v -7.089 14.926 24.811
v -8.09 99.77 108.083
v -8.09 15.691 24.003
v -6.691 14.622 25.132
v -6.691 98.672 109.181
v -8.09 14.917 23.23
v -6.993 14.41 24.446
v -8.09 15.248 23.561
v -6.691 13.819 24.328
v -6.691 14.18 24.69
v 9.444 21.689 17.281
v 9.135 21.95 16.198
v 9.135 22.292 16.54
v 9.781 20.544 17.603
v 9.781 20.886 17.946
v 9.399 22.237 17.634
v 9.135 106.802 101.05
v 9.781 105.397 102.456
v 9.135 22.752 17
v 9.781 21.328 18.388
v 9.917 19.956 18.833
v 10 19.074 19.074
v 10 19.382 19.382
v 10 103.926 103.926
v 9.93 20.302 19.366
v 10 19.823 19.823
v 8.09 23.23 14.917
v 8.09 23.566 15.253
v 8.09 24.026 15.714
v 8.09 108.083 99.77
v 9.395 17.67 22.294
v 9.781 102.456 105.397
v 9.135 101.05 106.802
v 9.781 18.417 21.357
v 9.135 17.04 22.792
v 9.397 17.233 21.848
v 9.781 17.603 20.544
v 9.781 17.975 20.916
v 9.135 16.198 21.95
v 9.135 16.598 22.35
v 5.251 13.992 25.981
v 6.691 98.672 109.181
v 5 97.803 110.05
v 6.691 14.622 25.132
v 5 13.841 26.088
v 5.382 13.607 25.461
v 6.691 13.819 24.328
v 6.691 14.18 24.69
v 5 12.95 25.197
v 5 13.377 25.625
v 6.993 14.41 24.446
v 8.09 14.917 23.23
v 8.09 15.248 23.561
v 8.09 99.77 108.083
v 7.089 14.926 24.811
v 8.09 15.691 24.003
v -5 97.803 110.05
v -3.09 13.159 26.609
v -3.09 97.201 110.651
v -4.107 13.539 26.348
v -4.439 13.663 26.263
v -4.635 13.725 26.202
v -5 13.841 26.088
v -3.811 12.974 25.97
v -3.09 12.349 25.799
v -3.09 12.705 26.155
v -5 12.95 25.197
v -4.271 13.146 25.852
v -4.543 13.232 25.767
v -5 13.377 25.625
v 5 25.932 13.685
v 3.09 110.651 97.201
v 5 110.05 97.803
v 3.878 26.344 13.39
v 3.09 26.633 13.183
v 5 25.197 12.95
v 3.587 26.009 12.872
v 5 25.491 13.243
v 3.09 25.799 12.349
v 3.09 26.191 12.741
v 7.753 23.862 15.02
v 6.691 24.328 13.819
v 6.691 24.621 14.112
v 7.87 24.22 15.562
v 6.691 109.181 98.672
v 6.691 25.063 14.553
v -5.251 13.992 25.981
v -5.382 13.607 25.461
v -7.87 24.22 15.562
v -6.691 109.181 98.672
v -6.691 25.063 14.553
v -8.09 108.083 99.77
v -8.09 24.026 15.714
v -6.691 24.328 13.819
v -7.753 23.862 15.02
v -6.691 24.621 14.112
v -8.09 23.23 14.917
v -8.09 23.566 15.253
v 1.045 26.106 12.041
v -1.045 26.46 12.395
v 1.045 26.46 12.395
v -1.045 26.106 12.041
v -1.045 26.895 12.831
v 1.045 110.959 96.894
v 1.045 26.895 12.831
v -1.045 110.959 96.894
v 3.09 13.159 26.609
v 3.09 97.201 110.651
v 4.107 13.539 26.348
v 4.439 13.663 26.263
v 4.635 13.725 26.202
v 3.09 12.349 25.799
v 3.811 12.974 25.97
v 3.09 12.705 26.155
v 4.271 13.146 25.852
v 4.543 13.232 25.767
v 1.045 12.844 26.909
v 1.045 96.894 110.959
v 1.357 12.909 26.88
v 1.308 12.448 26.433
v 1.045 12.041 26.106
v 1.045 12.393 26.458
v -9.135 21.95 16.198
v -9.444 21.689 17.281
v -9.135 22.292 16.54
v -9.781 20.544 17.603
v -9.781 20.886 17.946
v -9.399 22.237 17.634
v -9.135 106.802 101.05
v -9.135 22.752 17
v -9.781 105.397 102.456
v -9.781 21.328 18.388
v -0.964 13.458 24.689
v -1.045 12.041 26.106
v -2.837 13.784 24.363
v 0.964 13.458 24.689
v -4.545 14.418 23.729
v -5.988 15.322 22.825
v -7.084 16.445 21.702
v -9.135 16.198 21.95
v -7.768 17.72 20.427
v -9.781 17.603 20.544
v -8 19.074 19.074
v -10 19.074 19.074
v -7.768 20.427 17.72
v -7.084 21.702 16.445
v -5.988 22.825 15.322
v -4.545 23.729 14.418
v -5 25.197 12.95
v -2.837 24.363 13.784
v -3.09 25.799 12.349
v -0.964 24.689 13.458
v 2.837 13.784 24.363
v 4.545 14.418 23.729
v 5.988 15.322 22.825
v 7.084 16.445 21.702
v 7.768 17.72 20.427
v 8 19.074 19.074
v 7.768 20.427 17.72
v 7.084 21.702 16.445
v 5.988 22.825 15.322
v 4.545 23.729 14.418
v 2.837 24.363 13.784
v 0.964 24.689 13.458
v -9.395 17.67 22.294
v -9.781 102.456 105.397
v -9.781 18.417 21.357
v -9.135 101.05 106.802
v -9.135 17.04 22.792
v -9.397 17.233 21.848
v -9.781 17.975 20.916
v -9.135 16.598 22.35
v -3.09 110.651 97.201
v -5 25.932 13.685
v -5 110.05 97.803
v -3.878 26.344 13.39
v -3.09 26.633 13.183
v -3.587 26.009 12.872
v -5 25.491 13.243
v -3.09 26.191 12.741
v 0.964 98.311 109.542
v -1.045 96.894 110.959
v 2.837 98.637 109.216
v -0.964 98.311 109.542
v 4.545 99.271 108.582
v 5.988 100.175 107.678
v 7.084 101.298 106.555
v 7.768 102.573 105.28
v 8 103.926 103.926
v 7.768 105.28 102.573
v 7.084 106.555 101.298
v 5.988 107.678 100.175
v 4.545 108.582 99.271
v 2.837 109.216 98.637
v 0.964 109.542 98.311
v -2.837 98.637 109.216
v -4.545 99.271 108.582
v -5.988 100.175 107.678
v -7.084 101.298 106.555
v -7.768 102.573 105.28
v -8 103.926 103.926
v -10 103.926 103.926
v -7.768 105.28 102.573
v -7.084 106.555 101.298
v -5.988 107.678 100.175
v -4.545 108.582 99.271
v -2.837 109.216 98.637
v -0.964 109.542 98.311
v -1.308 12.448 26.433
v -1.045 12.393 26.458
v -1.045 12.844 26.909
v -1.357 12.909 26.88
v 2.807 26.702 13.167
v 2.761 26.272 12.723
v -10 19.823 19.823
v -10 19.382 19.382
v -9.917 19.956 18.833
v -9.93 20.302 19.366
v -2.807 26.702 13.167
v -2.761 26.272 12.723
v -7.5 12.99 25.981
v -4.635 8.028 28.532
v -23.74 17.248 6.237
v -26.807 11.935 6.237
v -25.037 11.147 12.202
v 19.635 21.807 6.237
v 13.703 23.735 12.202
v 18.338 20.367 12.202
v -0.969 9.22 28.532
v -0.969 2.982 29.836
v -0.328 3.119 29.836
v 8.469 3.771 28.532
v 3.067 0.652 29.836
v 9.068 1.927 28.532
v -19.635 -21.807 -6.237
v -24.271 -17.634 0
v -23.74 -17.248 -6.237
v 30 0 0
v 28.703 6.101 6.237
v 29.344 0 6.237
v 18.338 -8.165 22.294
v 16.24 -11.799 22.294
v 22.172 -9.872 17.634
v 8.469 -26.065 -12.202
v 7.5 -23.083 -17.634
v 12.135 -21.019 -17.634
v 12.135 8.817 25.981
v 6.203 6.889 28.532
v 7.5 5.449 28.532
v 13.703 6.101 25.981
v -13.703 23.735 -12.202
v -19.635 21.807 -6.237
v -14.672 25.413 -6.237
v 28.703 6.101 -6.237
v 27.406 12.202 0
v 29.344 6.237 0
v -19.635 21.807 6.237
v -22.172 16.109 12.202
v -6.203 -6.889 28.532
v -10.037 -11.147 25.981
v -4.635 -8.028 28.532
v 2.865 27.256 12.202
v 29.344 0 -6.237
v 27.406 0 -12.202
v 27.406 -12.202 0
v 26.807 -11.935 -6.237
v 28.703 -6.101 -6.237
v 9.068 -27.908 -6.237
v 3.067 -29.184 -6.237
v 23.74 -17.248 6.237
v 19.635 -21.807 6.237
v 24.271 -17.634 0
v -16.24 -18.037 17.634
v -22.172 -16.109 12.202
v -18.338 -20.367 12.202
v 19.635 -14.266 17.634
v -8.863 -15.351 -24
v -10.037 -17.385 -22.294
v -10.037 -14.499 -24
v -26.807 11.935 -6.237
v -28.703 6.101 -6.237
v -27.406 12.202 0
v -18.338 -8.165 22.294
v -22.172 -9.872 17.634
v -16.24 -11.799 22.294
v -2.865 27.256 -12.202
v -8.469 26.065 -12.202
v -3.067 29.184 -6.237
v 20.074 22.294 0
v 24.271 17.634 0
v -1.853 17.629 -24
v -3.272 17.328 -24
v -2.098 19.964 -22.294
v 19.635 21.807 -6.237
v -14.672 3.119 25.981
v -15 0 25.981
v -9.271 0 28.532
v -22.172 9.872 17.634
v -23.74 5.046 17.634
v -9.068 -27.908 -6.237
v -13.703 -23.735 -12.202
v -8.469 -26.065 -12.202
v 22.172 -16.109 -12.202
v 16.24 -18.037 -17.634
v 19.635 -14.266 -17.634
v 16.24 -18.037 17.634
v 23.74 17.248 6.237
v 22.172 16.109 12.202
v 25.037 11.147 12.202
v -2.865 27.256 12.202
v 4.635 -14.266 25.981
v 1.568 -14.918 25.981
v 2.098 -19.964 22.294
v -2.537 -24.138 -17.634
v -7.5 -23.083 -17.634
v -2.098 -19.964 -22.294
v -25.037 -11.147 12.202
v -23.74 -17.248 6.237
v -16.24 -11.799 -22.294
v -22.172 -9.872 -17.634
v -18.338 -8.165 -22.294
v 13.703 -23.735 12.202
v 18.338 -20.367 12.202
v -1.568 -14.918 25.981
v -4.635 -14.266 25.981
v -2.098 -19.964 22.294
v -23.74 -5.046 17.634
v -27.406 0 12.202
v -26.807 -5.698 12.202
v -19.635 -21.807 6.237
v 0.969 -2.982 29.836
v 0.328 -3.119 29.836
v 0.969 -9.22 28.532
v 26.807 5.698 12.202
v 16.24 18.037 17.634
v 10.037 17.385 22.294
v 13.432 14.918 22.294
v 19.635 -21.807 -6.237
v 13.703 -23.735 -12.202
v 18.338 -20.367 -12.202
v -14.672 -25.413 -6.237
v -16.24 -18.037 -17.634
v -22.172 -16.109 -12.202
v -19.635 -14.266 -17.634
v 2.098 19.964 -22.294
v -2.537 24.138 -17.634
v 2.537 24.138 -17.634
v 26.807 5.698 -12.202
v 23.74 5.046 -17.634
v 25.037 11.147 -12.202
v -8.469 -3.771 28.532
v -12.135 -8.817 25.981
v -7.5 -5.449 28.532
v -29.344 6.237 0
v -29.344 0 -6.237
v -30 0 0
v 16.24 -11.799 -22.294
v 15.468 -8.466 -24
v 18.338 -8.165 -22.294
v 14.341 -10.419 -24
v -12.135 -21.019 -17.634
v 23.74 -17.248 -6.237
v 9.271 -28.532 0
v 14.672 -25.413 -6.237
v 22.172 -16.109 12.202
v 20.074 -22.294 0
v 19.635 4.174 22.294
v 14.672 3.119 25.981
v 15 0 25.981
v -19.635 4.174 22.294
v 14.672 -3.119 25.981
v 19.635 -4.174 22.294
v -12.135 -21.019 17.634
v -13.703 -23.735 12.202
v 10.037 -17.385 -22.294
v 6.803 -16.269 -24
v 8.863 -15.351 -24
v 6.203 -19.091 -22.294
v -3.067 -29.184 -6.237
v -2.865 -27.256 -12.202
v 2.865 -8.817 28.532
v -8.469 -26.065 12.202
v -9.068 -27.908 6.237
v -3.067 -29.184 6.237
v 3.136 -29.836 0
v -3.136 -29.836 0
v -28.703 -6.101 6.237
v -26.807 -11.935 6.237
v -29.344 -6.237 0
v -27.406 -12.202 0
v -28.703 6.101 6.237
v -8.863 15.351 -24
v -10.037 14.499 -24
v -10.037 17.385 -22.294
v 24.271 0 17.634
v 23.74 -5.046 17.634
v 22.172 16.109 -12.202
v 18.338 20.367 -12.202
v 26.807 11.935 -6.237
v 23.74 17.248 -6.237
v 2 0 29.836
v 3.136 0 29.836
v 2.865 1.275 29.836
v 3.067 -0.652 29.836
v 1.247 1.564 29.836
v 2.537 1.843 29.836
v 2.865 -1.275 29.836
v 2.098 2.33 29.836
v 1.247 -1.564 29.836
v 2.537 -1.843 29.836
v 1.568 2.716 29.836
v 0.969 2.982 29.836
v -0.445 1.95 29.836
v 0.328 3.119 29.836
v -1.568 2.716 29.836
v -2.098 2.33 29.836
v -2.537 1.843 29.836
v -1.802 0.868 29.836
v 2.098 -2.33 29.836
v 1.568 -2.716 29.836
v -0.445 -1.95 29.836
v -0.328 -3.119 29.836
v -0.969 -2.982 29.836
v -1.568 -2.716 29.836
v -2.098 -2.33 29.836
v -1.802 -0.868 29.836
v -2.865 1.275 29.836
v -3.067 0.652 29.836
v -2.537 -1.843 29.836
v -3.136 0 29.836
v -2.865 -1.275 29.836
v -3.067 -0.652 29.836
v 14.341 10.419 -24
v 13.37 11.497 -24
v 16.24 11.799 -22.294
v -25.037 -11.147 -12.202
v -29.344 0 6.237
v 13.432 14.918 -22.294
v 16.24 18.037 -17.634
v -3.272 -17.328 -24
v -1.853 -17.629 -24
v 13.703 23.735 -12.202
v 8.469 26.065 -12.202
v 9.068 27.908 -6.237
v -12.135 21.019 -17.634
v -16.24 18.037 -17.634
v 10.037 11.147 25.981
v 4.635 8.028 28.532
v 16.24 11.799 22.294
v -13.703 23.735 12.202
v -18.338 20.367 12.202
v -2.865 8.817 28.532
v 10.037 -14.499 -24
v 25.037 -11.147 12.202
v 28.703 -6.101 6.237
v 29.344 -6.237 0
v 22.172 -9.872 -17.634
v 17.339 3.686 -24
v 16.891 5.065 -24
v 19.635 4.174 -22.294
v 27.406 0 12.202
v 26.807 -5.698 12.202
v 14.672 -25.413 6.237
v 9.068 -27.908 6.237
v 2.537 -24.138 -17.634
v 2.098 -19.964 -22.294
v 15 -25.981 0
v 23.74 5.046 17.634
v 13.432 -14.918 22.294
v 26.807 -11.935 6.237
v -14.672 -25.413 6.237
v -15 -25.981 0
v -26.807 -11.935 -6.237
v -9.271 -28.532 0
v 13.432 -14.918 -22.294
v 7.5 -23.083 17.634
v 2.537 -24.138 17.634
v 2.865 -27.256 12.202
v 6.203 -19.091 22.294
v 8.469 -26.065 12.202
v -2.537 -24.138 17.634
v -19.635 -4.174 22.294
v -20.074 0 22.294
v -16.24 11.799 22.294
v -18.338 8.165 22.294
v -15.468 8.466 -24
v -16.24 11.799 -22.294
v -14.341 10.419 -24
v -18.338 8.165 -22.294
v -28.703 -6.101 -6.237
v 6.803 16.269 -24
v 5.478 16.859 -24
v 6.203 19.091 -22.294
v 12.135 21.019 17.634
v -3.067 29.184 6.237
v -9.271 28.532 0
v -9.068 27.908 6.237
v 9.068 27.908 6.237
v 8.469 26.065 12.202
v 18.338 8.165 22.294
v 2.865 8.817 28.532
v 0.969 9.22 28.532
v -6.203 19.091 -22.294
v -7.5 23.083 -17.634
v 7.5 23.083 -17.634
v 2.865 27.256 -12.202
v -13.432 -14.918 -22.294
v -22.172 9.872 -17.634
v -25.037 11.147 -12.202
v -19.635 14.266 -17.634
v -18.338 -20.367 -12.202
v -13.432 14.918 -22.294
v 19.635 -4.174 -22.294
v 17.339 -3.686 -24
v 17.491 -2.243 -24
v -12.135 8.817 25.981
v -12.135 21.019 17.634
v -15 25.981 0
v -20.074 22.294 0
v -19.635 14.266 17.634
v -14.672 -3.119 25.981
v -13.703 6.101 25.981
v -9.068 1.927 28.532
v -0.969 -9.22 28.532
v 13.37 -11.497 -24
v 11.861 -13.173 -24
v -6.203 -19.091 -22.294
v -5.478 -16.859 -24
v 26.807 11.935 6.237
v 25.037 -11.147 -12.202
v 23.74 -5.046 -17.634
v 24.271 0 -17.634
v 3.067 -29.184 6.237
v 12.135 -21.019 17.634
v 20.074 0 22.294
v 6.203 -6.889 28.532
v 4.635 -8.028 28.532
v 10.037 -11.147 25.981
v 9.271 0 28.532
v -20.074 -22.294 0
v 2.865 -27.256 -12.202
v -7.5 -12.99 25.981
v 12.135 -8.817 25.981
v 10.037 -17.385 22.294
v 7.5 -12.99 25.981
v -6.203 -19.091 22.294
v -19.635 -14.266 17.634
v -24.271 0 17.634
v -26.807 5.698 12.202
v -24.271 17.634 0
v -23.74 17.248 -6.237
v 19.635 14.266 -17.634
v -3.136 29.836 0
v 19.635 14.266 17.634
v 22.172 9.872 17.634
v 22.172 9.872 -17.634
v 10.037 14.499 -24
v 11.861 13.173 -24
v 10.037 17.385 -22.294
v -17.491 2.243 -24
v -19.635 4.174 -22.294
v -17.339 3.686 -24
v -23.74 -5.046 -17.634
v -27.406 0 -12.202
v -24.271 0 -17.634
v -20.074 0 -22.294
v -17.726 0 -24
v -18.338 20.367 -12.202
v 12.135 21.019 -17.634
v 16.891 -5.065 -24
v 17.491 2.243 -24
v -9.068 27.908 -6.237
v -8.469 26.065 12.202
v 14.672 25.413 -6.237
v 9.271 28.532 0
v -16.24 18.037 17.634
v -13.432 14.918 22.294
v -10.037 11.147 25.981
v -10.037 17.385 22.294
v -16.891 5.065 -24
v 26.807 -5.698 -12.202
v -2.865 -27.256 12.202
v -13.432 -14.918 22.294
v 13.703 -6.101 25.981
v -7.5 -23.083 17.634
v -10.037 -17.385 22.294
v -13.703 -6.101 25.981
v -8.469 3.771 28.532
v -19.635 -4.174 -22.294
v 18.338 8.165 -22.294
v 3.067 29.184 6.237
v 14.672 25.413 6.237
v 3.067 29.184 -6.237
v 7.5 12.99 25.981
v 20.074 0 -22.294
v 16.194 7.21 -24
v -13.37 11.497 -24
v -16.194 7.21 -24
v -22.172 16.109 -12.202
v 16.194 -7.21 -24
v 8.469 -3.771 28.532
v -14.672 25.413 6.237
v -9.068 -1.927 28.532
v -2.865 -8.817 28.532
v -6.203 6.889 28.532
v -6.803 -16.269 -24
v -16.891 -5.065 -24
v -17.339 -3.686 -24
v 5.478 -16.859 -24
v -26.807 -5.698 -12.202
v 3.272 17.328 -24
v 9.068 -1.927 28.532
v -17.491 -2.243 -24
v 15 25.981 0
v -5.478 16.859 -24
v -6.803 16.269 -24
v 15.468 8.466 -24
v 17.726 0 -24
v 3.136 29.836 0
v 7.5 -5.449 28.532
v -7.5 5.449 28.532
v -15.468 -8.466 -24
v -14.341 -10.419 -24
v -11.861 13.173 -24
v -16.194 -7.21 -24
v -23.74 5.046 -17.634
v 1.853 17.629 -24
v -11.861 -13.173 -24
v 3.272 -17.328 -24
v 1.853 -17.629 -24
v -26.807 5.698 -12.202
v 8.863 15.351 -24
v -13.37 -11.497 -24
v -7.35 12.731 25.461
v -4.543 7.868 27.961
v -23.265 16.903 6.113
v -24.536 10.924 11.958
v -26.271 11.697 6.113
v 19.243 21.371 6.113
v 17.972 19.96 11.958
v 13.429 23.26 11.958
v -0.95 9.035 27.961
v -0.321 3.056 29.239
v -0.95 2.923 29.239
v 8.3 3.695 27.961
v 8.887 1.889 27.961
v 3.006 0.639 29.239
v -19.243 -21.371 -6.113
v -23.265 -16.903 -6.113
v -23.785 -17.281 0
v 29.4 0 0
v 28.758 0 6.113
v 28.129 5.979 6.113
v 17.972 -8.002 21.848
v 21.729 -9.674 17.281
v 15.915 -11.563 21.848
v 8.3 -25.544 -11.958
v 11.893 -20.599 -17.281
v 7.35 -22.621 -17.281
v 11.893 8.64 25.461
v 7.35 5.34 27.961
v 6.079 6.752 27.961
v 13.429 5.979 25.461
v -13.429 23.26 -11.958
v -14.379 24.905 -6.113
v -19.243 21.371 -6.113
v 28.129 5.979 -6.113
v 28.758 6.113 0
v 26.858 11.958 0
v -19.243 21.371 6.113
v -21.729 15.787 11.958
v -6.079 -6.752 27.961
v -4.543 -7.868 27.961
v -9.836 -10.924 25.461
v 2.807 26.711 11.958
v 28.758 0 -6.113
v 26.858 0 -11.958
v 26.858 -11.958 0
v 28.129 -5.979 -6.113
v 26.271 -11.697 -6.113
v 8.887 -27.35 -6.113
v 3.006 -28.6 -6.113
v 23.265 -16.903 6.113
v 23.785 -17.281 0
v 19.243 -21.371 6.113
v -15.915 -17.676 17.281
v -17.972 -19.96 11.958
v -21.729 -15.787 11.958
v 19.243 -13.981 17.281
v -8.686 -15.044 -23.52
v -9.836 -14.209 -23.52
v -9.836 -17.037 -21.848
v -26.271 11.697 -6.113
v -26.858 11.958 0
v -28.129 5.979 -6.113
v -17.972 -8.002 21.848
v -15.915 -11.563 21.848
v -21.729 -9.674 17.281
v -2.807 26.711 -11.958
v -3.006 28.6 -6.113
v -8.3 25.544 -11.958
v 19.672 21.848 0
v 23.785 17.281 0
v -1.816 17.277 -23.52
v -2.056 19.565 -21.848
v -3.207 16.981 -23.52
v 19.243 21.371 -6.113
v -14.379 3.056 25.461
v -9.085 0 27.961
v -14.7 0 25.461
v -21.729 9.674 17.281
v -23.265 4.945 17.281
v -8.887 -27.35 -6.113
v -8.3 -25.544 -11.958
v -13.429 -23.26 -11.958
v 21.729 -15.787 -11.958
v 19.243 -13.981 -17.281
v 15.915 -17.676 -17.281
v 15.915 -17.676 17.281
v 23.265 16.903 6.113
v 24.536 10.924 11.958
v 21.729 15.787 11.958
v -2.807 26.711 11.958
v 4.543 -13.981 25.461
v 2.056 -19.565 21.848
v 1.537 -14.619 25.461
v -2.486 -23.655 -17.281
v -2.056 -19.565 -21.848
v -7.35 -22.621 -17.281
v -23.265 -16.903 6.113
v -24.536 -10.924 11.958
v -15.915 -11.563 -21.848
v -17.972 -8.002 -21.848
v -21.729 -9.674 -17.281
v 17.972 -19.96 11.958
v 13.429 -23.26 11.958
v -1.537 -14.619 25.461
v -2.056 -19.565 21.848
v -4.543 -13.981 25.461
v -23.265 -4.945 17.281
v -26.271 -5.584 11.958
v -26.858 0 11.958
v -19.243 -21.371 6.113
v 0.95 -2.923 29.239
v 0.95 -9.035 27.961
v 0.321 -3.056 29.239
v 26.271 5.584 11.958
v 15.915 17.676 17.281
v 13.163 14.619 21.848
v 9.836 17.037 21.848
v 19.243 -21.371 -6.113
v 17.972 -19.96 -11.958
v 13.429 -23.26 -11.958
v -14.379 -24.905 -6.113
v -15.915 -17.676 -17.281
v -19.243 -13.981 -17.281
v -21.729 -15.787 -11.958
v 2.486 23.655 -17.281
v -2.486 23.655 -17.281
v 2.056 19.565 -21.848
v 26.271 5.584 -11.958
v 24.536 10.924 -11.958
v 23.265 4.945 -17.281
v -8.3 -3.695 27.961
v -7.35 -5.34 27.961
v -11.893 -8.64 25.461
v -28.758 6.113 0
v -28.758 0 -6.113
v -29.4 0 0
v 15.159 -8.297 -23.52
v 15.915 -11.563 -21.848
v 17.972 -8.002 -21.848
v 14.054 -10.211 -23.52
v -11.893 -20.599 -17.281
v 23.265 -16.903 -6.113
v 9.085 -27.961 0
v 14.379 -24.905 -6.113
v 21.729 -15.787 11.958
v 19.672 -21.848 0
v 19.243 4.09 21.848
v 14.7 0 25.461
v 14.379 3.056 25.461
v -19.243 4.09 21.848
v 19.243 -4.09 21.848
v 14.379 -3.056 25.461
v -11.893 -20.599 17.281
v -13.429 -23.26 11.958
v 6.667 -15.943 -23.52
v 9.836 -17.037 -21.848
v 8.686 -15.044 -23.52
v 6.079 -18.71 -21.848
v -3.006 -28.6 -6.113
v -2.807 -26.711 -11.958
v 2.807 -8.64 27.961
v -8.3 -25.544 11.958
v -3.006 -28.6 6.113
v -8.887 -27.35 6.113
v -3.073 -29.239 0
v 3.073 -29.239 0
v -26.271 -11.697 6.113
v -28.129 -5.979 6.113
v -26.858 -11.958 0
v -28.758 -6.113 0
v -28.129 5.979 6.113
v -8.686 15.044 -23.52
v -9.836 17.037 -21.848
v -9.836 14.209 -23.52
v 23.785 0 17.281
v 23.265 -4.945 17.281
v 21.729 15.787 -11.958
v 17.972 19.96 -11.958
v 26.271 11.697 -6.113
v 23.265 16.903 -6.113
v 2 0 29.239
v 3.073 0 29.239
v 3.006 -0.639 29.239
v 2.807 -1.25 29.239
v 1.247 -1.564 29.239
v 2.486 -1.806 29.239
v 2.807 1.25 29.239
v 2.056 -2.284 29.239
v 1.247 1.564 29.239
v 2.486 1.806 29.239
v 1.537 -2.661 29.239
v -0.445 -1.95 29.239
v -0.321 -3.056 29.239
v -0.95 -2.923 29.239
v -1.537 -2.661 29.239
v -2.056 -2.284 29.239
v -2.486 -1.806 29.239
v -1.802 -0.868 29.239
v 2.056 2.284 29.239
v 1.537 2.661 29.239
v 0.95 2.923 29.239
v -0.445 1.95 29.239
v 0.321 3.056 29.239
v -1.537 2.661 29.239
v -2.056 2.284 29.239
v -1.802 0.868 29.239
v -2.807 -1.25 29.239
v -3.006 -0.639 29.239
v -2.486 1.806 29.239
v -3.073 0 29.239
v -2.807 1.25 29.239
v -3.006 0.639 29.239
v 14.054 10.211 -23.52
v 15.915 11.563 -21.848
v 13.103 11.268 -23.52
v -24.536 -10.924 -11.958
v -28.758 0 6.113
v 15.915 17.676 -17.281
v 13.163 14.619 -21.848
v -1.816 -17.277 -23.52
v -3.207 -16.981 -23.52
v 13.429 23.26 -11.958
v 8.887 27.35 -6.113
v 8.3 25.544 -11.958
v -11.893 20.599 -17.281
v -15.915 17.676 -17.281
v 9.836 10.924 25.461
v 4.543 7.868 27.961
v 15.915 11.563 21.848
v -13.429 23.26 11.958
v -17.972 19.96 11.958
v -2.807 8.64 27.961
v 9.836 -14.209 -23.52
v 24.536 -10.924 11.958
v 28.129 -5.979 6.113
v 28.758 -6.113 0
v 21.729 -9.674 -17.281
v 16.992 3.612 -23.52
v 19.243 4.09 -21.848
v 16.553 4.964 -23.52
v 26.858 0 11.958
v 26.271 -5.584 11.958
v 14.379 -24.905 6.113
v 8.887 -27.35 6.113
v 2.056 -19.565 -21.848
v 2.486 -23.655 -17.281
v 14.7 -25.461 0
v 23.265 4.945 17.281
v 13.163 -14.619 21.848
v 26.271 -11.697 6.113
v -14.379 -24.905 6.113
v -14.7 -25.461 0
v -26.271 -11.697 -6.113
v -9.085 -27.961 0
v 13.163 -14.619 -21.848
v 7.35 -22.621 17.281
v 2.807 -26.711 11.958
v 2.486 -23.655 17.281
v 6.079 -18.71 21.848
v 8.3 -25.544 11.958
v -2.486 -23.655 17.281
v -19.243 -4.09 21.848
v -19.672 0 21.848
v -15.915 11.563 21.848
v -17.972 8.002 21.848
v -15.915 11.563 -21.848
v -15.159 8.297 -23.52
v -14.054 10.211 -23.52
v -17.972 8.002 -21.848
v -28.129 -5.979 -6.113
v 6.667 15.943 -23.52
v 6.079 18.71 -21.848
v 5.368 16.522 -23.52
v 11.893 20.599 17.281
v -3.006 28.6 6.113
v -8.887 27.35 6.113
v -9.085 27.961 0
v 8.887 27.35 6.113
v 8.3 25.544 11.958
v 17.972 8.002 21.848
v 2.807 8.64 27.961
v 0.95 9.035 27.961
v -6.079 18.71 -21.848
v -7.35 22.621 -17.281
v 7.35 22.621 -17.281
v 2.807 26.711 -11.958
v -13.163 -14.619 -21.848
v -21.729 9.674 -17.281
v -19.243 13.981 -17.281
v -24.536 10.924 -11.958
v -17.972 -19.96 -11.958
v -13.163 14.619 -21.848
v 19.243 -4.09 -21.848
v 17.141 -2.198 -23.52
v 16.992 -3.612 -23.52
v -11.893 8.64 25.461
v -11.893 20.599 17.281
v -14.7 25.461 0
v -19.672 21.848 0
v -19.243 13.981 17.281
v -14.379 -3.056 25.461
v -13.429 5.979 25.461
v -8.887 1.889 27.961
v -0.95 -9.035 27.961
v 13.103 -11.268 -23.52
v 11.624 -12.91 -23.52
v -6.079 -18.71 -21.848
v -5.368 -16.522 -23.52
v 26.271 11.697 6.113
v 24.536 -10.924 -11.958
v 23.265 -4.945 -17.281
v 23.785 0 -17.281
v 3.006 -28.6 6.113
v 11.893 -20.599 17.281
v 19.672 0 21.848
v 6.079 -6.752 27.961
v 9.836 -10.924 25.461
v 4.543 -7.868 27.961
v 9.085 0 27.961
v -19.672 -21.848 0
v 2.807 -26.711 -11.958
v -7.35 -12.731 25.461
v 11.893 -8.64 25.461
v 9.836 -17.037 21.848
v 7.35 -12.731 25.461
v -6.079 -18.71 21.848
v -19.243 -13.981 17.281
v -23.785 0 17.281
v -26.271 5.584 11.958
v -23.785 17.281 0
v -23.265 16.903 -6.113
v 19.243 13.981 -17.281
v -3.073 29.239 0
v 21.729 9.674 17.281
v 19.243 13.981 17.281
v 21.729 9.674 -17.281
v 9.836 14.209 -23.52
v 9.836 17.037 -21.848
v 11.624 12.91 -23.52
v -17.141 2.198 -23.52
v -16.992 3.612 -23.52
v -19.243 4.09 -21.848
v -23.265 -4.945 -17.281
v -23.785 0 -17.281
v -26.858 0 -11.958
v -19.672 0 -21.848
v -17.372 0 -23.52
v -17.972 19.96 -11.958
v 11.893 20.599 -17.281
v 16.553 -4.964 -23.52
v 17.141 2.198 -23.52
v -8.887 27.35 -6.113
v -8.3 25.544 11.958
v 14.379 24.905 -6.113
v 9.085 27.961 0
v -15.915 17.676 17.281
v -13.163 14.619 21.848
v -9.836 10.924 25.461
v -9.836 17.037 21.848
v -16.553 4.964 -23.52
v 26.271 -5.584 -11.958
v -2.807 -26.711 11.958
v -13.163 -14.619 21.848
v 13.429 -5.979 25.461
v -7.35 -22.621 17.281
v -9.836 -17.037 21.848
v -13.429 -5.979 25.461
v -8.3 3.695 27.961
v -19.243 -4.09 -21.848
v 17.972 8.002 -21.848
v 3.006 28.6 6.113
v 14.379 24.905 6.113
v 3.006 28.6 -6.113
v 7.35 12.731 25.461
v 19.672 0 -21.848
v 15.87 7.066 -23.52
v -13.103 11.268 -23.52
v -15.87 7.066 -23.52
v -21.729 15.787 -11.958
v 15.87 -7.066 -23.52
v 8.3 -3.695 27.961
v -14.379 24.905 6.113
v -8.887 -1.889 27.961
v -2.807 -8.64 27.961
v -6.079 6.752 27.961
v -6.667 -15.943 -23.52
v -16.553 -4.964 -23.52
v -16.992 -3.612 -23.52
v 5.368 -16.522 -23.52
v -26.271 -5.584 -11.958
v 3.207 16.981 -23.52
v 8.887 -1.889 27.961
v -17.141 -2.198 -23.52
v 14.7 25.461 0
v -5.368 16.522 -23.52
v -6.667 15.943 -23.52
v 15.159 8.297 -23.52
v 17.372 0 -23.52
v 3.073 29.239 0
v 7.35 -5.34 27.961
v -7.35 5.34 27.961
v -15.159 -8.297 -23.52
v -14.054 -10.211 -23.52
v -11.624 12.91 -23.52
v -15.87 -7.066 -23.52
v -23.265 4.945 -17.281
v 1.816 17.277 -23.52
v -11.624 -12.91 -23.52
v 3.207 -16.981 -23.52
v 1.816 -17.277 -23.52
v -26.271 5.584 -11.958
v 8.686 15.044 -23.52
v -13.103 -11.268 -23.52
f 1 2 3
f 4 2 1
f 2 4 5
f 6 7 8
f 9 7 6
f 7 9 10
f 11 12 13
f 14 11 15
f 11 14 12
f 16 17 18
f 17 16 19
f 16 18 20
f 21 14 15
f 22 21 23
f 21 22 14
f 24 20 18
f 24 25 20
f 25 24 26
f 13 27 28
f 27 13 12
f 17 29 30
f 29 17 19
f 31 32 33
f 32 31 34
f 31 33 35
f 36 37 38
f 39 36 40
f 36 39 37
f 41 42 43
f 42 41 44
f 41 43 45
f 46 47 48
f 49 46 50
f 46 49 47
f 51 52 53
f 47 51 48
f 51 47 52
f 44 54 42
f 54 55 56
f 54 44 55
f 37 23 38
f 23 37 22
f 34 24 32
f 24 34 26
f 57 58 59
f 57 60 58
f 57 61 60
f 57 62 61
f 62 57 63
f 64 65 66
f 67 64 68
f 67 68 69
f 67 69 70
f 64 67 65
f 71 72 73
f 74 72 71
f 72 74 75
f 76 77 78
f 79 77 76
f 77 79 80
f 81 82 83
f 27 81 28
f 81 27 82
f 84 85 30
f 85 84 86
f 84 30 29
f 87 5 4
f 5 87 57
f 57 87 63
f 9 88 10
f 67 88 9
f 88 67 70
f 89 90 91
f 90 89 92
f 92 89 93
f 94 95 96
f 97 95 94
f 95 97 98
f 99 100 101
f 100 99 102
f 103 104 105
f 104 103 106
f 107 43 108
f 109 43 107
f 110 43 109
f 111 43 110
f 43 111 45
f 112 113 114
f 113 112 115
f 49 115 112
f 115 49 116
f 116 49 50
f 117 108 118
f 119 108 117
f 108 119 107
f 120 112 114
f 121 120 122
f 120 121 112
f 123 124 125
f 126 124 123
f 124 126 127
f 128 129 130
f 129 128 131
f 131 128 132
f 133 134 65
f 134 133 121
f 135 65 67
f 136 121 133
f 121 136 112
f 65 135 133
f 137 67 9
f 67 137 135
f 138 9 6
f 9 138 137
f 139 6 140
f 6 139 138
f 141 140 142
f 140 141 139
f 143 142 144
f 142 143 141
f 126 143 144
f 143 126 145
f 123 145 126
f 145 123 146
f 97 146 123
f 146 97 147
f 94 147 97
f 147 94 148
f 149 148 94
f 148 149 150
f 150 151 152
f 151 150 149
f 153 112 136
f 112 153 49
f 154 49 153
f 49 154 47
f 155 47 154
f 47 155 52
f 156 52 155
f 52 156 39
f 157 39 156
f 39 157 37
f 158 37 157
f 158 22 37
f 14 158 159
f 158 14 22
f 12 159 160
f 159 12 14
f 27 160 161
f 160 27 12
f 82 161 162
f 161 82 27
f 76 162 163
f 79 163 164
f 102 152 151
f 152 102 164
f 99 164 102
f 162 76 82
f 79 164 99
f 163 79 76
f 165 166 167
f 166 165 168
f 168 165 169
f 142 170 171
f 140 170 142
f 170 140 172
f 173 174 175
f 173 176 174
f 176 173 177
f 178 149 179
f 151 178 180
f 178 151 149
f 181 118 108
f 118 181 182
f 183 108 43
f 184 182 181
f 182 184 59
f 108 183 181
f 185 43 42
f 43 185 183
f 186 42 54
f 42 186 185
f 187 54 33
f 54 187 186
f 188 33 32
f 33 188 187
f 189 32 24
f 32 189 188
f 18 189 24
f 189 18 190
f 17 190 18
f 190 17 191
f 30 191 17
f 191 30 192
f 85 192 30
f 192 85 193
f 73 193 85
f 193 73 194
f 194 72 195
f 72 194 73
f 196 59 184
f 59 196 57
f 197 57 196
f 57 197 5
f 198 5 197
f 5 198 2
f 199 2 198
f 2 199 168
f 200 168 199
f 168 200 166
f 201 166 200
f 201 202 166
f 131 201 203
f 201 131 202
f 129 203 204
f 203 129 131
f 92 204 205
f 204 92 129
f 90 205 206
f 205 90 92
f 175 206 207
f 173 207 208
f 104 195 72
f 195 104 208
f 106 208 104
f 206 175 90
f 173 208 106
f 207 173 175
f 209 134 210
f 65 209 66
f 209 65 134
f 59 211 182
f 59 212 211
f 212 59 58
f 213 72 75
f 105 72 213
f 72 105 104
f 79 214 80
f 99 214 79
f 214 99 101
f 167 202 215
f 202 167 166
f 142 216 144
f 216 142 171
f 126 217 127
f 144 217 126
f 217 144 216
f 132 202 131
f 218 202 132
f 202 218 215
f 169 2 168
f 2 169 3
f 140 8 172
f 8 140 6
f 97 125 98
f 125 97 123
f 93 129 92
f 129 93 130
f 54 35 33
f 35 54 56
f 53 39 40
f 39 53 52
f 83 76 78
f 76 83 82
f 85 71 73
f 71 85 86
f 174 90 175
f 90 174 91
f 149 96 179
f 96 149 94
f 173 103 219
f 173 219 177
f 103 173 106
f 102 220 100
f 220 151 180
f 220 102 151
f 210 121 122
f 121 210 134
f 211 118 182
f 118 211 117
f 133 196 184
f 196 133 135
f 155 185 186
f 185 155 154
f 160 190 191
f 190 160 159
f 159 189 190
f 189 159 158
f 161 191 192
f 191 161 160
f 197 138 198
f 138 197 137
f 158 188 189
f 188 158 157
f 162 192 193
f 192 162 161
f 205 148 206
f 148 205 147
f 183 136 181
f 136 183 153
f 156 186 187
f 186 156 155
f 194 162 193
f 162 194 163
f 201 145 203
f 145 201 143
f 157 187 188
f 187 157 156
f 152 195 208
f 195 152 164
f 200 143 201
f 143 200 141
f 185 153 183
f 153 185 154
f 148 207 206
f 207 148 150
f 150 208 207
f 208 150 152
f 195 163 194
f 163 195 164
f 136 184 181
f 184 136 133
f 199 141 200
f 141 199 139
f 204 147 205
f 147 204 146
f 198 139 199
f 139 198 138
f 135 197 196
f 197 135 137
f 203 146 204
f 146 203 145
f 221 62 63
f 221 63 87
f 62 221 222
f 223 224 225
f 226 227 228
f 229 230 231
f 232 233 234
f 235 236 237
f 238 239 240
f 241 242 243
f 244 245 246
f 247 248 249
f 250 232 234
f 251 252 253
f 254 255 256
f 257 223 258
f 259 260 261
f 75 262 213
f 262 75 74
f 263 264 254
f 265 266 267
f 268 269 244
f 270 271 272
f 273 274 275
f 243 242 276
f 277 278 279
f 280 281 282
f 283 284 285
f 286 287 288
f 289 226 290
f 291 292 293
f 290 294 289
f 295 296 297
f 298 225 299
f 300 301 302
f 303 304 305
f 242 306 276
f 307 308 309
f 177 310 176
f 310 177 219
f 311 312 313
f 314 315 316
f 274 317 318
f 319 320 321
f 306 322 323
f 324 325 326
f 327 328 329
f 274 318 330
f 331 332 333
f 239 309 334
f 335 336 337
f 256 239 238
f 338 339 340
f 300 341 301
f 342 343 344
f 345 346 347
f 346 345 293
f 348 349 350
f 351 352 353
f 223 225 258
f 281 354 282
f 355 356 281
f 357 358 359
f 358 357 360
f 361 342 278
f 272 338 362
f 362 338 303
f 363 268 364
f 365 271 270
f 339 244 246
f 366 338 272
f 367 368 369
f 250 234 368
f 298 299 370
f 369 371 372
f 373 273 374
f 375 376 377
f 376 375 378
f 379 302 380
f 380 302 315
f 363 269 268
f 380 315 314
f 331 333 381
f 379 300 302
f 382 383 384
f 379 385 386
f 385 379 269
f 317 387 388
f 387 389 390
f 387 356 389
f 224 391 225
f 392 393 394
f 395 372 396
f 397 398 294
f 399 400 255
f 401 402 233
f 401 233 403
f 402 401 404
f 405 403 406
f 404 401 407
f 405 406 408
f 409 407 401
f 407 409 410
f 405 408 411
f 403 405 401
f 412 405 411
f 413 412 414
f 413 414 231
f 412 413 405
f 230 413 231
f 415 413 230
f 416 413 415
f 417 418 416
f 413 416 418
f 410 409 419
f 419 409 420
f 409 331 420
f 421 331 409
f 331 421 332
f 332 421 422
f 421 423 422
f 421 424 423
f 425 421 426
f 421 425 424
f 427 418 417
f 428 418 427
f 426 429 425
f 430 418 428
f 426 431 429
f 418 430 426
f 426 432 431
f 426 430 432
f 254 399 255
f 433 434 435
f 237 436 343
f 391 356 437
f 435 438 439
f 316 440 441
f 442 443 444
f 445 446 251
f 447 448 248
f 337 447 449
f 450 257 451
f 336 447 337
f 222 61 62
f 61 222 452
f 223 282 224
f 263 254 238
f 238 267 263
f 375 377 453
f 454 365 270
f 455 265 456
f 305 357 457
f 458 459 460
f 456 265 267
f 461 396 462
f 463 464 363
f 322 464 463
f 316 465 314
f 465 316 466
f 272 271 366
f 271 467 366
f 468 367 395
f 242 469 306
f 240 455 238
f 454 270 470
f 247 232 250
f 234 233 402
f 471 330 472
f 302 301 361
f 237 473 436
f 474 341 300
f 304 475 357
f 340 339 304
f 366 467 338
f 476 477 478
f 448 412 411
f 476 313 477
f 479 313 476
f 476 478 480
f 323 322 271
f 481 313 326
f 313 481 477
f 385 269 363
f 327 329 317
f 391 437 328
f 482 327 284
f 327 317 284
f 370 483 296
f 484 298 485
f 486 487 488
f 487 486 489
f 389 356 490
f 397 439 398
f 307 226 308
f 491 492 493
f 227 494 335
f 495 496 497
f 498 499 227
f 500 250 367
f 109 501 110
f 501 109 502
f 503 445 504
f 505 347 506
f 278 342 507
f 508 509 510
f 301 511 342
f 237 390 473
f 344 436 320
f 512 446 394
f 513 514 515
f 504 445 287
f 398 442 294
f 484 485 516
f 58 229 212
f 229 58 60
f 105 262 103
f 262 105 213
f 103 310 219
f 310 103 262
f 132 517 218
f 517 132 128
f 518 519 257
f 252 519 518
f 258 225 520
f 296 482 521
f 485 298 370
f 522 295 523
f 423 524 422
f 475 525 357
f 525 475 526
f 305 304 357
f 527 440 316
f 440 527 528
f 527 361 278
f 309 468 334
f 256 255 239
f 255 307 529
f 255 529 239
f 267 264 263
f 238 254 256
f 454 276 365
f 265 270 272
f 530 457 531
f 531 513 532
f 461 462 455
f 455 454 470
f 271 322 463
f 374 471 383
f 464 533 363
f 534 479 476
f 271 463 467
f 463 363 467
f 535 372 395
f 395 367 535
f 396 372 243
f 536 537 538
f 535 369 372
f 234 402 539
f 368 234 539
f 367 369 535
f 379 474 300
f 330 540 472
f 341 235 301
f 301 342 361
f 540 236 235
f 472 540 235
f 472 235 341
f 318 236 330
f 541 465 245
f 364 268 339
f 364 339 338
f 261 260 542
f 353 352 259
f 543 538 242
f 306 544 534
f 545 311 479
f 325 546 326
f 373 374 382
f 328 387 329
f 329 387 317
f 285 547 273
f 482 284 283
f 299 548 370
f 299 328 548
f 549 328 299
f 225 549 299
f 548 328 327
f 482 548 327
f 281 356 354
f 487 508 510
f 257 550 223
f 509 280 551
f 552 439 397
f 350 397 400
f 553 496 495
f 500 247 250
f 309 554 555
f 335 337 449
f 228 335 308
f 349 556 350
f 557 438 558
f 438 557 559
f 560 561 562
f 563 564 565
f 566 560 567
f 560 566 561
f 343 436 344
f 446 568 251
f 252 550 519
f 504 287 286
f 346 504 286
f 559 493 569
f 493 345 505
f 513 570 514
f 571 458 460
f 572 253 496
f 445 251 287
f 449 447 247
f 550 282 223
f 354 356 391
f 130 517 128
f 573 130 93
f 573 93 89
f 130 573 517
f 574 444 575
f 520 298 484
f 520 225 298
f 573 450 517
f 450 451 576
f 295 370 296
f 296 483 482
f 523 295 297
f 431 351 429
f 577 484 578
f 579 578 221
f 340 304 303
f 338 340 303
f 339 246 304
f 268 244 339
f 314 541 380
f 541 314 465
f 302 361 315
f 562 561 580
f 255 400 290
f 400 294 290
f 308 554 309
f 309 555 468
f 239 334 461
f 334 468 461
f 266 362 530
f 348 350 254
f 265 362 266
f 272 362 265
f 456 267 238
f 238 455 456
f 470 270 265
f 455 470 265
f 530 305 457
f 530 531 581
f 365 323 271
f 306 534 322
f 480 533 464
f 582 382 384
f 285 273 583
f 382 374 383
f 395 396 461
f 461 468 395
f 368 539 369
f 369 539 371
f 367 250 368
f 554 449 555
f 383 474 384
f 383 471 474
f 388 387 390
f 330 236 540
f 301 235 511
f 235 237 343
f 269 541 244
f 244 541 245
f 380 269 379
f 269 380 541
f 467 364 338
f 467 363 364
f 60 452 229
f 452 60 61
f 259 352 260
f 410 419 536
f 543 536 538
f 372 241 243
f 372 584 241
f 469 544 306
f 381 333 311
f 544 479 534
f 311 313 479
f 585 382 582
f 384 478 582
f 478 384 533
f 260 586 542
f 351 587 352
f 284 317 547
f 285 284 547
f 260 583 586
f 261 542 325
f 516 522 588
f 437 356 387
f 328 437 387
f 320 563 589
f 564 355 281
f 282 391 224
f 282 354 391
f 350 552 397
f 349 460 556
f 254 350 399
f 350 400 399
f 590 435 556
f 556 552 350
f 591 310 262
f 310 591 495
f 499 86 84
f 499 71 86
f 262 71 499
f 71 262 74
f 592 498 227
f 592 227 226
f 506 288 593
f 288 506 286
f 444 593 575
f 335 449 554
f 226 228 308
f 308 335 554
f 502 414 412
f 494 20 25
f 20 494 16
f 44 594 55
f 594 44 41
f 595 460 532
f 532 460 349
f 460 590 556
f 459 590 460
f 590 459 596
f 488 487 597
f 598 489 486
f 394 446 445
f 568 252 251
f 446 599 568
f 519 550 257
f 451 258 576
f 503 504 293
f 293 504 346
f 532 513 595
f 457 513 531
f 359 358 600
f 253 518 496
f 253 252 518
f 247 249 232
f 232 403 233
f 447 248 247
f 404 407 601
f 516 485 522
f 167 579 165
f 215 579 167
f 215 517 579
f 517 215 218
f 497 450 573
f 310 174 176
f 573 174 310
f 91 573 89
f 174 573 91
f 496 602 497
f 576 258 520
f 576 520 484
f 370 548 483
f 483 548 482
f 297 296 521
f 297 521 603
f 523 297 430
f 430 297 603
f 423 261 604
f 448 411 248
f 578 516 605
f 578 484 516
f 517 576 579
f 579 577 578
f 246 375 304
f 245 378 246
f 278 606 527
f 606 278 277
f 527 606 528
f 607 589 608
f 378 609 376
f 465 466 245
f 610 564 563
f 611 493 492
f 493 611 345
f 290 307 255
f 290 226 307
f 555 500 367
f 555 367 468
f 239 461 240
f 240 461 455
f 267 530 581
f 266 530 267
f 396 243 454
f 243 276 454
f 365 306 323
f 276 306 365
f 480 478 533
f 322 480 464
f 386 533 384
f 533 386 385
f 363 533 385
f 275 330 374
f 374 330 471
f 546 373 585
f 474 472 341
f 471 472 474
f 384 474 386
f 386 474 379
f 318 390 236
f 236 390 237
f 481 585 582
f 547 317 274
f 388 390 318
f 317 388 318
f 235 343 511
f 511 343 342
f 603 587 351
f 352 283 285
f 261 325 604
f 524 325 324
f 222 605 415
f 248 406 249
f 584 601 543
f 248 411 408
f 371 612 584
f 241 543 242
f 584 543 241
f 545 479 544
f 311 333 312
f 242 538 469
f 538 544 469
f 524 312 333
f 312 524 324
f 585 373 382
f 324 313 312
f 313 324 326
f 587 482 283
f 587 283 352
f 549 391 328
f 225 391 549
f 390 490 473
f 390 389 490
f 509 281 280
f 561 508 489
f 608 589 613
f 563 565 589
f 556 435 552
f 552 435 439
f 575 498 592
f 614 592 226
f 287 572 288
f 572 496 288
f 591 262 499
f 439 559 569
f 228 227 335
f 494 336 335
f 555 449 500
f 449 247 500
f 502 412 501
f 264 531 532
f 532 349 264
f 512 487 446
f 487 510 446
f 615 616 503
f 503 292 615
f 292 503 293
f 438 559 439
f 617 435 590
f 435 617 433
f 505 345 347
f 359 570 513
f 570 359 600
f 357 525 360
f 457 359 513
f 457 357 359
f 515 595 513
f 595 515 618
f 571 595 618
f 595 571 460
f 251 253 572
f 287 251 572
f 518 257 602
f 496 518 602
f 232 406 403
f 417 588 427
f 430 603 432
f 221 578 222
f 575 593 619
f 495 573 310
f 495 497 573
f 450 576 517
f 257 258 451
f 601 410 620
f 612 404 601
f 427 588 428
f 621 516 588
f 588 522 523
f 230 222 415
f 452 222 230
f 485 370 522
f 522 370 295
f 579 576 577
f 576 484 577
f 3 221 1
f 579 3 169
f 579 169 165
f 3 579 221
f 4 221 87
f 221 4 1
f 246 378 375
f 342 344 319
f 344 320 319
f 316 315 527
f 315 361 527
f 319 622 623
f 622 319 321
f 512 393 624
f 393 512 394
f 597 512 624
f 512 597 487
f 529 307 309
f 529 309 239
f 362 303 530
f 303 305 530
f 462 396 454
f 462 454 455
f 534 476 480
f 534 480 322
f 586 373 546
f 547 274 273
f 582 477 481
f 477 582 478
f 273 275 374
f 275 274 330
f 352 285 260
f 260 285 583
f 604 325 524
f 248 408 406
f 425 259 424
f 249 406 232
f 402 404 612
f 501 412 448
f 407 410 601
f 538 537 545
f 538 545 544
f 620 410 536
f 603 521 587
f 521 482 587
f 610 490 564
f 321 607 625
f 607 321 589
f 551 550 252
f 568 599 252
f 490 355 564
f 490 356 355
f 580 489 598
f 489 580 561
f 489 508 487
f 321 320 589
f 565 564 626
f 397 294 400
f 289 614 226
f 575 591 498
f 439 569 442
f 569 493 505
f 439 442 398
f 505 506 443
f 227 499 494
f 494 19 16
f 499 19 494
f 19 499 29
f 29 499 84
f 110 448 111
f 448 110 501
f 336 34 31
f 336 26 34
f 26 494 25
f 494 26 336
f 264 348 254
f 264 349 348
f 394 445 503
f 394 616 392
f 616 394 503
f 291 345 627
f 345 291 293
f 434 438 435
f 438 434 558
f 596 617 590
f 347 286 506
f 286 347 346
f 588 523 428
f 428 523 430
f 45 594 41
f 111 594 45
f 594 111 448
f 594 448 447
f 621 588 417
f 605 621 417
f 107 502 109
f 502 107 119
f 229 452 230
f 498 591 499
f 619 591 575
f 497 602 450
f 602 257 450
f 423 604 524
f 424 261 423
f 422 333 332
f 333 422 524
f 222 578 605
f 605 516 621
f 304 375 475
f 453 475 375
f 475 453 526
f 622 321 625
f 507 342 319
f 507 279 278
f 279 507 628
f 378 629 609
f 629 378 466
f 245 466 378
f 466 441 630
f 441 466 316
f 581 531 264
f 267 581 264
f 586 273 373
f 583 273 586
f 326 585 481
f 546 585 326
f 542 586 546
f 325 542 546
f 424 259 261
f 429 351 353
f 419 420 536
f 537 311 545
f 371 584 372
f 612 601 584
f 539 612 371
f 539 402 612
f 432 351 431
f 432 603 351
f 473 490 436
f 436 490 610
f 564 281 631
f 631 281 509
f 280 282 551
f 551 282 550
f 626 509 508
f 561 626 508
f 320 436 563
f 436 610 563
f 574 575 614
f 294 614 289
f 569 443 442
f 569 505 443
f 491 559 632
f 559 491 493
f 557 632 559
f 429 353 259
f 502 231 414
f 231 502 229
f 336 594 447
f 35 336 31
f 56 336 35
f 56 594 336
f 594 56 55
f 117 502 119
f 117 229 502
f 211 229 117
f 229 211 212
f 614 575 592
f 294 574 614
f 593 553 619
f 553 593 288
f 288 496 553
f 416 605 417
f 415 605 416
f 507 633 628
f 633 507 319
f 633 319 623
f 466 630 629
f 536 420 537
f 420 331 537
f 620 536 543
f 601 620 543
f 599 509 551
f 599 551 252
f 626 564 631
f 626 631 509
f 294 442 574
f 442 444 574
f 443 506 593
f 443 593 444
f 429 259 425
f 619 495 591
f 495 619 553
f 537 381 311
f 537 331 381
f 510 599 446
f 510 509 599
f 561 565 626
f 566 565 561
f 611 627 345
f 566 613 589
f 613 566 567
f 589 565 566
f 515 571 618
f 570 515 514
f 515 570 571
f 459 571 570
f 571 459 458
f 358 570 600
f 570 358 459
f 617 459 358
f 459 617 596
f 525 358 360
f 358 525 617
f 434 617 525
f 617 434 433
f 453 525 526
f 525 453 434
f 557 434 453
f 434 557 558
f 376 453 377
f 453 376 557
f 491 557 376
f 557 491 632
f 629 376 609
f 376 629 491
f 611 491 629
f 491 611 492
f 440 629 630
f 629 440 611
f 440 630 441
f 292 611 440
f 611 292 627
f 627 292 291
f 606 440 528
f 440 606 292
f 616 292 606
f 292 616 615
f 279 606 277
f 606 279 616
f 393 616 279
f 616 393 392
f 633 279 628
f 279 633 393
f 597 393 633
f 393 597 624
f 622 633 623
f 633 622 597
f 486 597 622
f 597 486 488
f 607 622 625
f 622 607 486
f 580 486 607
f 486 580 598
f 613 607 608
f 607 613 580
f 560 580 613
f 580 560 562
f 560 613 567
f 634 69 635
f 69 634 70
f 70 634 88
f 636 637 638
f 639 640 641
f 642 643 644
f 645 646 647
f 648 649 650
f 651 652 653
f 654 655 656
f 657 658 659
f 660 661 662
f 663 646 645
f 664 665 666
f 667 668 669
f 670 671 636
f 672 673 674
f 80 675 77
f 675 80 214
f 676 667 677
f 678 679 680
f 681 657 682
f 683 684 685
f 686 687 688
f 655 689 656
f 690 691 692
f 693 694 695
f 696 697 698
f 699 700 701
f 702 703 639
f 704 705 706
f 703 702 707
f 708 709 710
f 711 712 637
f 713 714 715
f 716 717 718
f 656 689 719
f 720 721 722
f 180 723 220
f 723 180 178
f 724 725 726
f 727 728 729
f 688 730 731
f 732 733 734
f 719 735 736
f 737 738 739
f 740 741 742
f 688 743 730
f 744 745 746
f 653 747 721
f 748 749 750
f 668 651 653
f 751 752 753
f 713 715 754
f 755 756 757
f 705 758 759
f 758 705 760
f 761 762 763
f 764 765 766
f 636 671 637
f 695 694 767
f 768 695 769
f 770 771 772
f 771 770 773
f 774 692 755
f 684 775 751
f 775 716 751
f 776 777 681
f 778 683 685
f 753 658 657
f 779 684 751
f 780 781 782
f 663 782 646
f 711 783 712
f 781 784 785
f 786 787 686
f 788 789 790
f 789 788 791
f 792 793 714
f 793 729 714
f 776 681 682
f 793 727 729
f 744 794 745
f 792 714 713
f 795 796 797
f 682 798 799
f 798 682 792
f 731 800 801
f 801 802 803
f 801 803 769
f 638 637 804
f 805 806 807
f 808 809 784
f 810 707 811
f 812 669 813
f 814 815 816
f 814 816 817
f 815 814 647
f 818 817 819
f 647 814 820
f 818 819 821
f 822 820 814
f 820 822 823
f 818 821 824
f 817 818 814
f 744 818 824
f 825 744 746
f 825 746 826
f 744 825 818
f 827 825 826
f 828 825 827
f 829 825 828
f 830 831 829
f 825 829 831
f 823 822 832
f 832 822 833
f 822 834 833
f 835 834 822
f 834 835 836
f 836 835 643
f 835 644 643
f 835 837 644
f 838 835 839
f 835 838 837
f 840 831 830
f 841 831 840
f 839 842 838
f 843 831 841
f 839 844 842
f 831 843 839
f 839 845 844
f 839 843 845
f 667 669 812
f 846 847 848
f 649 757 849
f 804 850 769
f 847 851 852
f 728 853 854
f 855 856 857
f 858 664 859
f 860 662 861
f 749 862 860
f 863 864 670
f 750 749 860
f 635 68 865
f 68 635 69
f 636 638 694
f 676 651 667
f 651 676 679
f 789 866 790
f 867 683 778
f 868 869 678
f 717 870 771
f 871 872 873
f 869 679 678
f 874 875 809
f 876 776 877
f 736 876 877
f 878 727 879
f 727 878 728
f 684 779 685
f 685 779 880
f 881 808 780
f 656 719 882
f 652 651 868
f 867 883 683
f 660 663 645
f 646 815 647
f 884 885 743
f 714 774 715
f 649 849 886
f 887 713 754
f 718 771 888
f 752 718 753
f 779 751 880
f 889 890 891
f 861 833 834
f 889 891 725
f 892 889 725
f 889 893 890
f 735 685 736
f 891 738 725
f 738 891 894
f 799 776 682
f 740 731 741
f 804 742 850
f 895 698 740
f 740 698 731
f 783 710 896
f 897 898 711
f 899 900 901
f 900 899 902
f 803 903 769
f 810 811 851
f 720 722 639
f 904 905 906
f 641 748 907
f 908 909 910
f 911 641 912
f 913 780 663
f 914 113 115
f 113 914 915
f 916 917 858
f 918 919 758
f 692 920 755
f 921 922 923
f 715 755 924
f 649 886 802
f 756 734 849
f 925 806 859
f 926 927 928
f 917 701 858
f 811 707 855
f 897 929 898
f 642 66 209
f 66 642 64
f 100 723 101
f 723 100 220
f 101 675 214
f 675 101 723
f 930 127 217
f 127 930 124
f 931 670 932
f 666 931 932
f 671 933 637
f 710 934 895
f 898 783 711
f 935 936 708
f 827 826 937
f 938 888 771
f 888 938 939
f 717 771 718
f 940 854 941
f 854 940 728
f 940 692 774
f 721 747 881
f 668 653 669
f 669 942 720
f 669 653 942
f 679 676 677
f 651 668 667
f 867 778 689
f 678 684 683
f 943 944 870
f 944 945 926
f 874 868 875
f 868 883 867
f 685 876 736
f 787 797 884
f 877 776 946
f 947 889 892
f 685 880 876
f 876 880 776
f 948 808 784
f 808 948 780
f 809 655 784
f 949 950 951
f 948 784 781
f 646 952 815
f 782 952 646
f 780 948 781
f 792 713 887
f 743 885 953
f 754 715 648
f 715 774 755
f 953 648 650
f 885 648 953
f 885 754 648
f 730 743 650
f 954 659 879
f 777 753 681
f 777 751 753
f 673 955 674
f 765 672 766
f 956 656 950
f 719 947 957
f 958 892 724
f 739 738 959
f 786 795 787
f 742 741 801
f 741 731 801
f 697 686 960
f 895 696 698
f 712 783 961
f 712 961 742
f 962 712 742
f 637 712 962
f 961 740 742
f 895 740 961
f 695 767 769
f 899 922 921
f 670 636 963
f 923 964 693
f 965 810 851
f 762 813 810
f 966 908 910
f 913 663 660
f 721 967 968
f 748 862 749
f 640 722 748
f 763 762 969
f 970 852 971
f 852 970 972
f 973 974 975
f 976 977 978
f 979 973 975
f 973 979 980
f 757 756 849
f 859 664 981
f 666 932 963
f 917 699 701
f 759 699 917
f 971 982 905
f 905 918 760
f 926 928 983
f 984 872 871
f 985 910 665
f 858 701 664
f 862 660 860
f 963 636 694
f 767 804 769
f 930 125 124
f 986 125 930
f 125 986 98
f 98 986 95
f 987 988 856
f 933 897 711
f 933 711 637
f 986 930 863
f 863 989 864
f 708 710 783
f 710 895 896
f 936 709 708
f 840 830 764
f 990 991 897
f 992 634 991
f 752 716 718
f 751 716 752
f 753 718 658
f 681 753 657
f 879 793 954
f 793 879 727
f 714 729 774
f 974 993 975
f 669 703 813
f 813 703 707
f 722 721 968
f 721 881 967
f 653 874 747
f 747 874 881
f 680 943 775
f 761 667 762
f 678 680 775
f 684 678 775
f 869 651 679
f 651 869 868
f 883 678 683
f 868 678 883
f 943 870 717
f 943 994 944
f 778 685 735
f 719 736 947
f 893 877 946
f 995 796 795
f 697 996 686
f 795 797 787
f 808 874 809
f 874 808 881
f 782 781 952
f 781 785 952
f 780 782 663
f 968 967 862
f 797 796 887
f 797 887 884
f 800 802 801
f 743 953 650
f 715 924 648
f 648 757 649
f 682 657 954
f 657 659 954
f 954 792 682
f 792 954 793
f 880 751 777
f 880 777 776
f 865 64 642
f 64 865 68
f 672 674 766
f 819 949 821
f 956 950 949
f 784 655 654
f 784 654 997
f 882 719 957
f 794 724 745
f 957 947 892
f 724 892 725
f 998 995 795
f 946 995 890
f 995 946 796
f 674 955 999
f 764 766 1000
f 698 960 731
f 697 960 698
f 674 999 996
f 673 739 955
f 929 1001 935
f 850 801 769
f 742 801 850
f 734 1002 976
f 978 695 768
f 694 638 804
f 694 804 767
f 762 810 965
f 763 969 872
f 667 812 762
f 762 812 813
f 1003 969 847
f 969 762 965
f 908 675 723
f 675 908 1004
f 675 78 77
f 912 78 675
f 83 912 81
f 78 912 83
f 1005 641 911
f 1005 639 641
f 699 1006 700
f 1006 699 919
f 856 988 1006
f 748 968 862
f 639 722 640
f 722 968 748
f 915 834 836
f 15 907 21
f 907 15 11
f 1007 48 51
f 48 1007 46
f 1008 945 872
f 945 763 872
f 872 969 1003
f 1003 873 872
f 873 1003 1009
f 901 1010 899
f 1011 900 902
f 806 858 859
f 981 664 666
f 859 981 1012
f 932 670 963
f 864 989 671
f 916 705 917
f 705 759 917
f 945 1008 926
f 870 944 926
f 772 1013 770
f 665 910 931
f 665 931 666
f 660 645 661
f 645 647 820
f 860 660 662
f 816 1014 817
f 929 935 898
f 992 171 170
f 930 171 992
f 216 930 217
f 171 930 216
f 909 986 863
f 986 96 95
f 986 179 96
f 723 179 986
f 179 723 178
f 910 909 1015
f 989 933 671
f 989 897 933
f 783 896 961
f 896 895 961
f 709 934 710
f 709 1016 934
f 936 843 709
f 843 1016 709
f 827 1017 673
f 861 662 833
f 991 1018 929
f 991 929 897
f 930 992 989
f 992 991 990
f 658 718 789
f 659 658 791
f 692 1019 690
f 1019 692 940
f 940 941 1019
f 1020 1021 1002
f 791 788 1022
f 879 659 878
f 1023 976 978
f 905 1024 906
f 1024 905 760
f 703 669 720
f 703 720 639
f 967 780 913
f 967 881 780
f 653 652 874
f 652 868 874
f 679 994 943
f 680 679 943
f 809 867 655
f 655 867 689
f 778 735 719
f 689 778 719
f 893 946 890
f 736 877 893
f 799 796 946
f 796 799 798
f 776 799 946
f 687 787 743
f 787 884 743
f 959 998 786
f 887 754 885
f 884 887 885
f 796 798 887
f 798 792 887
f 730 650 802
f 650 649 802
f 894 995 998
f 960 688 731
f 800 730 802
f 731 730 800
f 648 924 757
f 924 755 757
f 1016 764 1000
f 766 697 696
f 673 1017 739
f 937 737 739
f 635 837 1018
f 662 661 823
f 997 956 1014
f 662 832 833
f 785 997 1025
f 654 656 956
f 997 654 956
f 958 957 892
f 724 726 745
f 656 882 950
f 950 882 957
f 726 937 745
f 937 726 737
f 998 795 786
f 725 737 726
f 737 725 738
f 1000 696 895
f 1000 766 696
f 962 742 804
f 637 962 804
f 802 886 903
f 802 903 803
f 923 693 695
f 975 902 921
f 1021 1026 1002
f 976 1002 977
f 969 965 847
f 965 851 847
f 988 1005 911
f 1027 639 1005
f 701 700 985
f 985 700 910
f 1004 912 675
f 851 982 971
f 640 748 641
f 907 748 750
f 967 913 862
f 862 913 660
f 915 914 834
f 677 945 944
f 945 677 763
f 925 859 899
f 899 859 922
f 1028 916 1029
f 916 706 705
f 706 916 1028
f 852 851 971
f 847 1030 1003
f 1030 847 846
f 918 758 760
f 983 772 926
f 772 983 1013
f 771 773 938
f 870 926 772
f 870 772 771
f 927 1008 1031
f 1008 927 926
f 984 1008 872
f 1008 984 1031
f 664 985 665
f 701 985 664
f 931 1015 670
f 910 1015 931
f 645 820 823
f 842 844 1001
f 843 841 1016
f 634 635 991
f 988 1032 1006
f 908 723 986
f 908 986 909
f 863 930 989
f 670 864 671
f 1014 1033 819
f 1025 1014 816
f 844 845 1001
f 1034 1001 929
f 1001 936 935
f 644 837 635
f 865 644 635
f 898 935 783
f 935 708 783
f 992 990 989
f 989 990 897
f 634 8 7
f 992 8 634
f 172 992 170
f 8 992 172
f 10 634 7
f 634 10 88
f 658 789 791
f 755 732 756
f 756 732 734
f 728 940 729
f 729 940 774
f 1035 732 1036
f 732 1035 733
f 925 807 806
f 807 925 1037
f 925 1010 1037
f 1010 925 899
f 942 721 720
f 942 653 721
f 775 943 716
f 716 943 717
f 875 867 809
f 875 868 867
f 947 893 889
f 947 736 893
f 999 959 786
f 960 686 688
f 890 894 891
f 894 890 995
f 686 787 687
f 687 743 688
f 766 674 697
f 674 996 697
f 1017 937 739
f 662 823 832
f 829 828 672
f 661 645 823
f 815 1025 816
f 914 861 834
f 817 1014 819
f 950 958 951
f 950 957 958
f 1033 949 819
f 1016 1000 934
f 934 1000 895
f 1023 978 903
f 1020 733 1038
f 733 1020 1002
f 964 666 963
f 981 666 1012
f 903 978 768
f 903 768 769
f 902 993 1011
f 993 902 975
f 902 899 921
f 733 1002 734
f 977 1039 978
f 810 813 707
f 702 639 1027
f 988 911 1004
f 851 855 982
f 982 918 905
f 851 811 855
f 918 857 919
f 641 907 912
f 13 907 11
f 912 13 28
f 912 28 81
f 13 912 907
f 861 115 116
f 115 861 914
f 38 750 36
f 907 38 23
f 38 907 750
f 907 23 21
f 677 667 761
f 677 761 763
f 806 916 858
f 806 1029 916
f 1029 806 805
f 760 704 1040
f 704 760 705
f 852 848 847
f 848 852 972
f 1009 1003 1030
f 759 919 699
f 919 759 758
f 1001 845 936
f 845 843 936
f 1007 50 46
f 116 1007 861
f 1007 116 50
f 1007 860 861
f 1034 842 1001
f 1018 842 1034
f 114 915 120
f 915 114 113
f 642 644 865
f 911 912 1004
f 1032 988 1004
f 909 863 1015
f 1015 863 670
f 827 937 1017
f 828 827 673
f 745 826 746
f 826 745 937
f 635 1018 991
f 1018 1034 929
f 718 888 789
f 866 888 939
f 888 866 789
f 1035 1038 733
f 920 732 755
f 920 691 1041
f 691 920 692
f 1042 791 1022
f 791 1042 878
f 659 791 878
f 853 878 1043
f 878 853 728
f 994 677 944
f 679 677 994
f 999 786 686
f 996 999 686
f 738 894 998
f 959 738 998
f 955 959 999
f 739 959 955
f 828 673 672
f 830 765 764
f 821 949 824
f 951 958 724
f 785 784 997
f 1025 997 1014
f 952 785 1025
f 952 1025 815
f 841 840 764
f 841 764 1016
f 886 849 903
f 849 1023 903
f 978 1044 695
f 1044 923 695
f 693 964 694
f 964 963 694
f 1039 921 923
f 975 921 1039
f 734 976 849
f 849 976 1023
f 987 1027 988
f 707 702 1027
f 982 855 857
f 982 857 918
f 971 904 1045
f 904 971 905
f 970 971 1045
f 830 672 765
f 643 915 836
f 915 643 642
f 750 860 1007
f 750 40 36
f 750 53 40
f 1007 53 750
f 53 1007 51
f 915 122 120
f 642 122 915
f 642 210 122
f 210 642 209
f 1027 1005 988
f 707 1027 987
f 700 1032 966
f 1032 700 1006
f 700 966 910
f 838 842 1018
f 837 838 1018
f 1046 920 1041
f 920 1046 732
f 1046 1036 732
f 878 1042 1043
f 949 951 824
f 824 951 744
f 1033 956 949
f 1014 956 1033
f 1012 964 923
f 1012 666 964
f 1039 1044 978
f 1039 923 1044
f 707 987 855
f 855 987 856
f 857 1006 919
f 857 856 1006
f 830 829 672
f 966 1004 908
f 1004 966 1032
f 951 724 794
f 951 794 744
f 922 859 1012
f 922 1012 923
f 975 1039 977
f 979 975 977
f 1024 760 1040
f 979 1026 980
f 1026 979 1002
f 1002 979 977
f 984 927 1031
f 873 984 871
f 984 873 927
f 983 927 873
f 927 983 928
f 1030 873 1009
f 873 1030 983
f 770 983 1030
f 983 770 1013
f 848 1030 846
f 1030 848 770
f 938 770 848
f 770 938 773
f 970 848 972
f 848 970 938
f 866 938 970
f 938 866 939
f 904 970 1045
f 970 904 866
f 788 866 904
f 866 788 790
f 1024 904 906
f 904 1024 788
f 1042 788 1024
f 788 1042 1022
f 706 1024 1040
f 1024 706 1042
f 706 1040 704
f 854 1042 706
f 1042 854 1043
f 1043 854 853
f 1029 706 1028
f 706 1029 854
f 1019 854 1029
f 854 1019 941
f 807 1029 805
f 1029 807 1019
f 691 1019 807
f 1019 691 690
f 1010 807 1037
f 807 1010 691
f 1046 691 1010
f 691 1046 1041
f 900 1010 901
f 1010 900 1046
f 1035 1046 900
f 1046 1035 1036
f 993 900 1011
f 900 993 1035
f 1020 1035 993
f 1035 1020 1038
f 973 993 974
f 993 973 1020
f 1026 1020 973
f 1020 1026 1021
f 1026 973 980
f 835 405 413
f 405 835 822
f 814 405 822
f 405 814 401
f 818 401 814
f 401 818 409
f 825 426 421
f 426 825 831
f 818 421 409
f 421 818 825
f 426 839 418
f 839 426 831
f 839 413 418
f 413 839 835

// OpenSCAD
plank = 1; //variable auxiliar para hacer substracciones sólidas

//Genera un cilindro
module maintube(largo,radio,grosor)
{
	//restar cilindro, con otro cilindro más largo y delgado
	difference()
	{
		cylinder(largo,radio,radio,center=true);
		translate([0,0,-plank/2])
		cylinder(largo+plank*2,radio-grosor,radio-grosor,center=true);
	}
}

module solidcontainer(radio)
{
	difference()
	{
		sphere(radio);
		translate([-radio,-radio,-radio*2.8])
		cube([radio*2,radio*2,radio*2]);
	}
}

module hollowcontainer(radio)
{
	difference()
    {
		solidcontainer(radio);
		scale([0.98,0.98,0.98]) solidcontainer(radio);
	}
}

//Main
module OpenBubbler(tubelength,containerradius)
{

	union()
	{
		translate([0,containerradius*2.05,containerradius*2.05])
		rotate([-45,0,0])
		maintube(tubelength,10,2);
		difference()
    		{
    			hollowcontainer(containerradius);
			union()
			{
				//cube([80,800,80]);
				translate([0,containerradius*2.05,containerradius*2.05])
		rotate([-45,0,0])
		cylinder(tubelength,9,9,center=true);
		cylinder(tubelength,2,2);
			}
		}    
	}
}

OpenBubbler(120,30);
